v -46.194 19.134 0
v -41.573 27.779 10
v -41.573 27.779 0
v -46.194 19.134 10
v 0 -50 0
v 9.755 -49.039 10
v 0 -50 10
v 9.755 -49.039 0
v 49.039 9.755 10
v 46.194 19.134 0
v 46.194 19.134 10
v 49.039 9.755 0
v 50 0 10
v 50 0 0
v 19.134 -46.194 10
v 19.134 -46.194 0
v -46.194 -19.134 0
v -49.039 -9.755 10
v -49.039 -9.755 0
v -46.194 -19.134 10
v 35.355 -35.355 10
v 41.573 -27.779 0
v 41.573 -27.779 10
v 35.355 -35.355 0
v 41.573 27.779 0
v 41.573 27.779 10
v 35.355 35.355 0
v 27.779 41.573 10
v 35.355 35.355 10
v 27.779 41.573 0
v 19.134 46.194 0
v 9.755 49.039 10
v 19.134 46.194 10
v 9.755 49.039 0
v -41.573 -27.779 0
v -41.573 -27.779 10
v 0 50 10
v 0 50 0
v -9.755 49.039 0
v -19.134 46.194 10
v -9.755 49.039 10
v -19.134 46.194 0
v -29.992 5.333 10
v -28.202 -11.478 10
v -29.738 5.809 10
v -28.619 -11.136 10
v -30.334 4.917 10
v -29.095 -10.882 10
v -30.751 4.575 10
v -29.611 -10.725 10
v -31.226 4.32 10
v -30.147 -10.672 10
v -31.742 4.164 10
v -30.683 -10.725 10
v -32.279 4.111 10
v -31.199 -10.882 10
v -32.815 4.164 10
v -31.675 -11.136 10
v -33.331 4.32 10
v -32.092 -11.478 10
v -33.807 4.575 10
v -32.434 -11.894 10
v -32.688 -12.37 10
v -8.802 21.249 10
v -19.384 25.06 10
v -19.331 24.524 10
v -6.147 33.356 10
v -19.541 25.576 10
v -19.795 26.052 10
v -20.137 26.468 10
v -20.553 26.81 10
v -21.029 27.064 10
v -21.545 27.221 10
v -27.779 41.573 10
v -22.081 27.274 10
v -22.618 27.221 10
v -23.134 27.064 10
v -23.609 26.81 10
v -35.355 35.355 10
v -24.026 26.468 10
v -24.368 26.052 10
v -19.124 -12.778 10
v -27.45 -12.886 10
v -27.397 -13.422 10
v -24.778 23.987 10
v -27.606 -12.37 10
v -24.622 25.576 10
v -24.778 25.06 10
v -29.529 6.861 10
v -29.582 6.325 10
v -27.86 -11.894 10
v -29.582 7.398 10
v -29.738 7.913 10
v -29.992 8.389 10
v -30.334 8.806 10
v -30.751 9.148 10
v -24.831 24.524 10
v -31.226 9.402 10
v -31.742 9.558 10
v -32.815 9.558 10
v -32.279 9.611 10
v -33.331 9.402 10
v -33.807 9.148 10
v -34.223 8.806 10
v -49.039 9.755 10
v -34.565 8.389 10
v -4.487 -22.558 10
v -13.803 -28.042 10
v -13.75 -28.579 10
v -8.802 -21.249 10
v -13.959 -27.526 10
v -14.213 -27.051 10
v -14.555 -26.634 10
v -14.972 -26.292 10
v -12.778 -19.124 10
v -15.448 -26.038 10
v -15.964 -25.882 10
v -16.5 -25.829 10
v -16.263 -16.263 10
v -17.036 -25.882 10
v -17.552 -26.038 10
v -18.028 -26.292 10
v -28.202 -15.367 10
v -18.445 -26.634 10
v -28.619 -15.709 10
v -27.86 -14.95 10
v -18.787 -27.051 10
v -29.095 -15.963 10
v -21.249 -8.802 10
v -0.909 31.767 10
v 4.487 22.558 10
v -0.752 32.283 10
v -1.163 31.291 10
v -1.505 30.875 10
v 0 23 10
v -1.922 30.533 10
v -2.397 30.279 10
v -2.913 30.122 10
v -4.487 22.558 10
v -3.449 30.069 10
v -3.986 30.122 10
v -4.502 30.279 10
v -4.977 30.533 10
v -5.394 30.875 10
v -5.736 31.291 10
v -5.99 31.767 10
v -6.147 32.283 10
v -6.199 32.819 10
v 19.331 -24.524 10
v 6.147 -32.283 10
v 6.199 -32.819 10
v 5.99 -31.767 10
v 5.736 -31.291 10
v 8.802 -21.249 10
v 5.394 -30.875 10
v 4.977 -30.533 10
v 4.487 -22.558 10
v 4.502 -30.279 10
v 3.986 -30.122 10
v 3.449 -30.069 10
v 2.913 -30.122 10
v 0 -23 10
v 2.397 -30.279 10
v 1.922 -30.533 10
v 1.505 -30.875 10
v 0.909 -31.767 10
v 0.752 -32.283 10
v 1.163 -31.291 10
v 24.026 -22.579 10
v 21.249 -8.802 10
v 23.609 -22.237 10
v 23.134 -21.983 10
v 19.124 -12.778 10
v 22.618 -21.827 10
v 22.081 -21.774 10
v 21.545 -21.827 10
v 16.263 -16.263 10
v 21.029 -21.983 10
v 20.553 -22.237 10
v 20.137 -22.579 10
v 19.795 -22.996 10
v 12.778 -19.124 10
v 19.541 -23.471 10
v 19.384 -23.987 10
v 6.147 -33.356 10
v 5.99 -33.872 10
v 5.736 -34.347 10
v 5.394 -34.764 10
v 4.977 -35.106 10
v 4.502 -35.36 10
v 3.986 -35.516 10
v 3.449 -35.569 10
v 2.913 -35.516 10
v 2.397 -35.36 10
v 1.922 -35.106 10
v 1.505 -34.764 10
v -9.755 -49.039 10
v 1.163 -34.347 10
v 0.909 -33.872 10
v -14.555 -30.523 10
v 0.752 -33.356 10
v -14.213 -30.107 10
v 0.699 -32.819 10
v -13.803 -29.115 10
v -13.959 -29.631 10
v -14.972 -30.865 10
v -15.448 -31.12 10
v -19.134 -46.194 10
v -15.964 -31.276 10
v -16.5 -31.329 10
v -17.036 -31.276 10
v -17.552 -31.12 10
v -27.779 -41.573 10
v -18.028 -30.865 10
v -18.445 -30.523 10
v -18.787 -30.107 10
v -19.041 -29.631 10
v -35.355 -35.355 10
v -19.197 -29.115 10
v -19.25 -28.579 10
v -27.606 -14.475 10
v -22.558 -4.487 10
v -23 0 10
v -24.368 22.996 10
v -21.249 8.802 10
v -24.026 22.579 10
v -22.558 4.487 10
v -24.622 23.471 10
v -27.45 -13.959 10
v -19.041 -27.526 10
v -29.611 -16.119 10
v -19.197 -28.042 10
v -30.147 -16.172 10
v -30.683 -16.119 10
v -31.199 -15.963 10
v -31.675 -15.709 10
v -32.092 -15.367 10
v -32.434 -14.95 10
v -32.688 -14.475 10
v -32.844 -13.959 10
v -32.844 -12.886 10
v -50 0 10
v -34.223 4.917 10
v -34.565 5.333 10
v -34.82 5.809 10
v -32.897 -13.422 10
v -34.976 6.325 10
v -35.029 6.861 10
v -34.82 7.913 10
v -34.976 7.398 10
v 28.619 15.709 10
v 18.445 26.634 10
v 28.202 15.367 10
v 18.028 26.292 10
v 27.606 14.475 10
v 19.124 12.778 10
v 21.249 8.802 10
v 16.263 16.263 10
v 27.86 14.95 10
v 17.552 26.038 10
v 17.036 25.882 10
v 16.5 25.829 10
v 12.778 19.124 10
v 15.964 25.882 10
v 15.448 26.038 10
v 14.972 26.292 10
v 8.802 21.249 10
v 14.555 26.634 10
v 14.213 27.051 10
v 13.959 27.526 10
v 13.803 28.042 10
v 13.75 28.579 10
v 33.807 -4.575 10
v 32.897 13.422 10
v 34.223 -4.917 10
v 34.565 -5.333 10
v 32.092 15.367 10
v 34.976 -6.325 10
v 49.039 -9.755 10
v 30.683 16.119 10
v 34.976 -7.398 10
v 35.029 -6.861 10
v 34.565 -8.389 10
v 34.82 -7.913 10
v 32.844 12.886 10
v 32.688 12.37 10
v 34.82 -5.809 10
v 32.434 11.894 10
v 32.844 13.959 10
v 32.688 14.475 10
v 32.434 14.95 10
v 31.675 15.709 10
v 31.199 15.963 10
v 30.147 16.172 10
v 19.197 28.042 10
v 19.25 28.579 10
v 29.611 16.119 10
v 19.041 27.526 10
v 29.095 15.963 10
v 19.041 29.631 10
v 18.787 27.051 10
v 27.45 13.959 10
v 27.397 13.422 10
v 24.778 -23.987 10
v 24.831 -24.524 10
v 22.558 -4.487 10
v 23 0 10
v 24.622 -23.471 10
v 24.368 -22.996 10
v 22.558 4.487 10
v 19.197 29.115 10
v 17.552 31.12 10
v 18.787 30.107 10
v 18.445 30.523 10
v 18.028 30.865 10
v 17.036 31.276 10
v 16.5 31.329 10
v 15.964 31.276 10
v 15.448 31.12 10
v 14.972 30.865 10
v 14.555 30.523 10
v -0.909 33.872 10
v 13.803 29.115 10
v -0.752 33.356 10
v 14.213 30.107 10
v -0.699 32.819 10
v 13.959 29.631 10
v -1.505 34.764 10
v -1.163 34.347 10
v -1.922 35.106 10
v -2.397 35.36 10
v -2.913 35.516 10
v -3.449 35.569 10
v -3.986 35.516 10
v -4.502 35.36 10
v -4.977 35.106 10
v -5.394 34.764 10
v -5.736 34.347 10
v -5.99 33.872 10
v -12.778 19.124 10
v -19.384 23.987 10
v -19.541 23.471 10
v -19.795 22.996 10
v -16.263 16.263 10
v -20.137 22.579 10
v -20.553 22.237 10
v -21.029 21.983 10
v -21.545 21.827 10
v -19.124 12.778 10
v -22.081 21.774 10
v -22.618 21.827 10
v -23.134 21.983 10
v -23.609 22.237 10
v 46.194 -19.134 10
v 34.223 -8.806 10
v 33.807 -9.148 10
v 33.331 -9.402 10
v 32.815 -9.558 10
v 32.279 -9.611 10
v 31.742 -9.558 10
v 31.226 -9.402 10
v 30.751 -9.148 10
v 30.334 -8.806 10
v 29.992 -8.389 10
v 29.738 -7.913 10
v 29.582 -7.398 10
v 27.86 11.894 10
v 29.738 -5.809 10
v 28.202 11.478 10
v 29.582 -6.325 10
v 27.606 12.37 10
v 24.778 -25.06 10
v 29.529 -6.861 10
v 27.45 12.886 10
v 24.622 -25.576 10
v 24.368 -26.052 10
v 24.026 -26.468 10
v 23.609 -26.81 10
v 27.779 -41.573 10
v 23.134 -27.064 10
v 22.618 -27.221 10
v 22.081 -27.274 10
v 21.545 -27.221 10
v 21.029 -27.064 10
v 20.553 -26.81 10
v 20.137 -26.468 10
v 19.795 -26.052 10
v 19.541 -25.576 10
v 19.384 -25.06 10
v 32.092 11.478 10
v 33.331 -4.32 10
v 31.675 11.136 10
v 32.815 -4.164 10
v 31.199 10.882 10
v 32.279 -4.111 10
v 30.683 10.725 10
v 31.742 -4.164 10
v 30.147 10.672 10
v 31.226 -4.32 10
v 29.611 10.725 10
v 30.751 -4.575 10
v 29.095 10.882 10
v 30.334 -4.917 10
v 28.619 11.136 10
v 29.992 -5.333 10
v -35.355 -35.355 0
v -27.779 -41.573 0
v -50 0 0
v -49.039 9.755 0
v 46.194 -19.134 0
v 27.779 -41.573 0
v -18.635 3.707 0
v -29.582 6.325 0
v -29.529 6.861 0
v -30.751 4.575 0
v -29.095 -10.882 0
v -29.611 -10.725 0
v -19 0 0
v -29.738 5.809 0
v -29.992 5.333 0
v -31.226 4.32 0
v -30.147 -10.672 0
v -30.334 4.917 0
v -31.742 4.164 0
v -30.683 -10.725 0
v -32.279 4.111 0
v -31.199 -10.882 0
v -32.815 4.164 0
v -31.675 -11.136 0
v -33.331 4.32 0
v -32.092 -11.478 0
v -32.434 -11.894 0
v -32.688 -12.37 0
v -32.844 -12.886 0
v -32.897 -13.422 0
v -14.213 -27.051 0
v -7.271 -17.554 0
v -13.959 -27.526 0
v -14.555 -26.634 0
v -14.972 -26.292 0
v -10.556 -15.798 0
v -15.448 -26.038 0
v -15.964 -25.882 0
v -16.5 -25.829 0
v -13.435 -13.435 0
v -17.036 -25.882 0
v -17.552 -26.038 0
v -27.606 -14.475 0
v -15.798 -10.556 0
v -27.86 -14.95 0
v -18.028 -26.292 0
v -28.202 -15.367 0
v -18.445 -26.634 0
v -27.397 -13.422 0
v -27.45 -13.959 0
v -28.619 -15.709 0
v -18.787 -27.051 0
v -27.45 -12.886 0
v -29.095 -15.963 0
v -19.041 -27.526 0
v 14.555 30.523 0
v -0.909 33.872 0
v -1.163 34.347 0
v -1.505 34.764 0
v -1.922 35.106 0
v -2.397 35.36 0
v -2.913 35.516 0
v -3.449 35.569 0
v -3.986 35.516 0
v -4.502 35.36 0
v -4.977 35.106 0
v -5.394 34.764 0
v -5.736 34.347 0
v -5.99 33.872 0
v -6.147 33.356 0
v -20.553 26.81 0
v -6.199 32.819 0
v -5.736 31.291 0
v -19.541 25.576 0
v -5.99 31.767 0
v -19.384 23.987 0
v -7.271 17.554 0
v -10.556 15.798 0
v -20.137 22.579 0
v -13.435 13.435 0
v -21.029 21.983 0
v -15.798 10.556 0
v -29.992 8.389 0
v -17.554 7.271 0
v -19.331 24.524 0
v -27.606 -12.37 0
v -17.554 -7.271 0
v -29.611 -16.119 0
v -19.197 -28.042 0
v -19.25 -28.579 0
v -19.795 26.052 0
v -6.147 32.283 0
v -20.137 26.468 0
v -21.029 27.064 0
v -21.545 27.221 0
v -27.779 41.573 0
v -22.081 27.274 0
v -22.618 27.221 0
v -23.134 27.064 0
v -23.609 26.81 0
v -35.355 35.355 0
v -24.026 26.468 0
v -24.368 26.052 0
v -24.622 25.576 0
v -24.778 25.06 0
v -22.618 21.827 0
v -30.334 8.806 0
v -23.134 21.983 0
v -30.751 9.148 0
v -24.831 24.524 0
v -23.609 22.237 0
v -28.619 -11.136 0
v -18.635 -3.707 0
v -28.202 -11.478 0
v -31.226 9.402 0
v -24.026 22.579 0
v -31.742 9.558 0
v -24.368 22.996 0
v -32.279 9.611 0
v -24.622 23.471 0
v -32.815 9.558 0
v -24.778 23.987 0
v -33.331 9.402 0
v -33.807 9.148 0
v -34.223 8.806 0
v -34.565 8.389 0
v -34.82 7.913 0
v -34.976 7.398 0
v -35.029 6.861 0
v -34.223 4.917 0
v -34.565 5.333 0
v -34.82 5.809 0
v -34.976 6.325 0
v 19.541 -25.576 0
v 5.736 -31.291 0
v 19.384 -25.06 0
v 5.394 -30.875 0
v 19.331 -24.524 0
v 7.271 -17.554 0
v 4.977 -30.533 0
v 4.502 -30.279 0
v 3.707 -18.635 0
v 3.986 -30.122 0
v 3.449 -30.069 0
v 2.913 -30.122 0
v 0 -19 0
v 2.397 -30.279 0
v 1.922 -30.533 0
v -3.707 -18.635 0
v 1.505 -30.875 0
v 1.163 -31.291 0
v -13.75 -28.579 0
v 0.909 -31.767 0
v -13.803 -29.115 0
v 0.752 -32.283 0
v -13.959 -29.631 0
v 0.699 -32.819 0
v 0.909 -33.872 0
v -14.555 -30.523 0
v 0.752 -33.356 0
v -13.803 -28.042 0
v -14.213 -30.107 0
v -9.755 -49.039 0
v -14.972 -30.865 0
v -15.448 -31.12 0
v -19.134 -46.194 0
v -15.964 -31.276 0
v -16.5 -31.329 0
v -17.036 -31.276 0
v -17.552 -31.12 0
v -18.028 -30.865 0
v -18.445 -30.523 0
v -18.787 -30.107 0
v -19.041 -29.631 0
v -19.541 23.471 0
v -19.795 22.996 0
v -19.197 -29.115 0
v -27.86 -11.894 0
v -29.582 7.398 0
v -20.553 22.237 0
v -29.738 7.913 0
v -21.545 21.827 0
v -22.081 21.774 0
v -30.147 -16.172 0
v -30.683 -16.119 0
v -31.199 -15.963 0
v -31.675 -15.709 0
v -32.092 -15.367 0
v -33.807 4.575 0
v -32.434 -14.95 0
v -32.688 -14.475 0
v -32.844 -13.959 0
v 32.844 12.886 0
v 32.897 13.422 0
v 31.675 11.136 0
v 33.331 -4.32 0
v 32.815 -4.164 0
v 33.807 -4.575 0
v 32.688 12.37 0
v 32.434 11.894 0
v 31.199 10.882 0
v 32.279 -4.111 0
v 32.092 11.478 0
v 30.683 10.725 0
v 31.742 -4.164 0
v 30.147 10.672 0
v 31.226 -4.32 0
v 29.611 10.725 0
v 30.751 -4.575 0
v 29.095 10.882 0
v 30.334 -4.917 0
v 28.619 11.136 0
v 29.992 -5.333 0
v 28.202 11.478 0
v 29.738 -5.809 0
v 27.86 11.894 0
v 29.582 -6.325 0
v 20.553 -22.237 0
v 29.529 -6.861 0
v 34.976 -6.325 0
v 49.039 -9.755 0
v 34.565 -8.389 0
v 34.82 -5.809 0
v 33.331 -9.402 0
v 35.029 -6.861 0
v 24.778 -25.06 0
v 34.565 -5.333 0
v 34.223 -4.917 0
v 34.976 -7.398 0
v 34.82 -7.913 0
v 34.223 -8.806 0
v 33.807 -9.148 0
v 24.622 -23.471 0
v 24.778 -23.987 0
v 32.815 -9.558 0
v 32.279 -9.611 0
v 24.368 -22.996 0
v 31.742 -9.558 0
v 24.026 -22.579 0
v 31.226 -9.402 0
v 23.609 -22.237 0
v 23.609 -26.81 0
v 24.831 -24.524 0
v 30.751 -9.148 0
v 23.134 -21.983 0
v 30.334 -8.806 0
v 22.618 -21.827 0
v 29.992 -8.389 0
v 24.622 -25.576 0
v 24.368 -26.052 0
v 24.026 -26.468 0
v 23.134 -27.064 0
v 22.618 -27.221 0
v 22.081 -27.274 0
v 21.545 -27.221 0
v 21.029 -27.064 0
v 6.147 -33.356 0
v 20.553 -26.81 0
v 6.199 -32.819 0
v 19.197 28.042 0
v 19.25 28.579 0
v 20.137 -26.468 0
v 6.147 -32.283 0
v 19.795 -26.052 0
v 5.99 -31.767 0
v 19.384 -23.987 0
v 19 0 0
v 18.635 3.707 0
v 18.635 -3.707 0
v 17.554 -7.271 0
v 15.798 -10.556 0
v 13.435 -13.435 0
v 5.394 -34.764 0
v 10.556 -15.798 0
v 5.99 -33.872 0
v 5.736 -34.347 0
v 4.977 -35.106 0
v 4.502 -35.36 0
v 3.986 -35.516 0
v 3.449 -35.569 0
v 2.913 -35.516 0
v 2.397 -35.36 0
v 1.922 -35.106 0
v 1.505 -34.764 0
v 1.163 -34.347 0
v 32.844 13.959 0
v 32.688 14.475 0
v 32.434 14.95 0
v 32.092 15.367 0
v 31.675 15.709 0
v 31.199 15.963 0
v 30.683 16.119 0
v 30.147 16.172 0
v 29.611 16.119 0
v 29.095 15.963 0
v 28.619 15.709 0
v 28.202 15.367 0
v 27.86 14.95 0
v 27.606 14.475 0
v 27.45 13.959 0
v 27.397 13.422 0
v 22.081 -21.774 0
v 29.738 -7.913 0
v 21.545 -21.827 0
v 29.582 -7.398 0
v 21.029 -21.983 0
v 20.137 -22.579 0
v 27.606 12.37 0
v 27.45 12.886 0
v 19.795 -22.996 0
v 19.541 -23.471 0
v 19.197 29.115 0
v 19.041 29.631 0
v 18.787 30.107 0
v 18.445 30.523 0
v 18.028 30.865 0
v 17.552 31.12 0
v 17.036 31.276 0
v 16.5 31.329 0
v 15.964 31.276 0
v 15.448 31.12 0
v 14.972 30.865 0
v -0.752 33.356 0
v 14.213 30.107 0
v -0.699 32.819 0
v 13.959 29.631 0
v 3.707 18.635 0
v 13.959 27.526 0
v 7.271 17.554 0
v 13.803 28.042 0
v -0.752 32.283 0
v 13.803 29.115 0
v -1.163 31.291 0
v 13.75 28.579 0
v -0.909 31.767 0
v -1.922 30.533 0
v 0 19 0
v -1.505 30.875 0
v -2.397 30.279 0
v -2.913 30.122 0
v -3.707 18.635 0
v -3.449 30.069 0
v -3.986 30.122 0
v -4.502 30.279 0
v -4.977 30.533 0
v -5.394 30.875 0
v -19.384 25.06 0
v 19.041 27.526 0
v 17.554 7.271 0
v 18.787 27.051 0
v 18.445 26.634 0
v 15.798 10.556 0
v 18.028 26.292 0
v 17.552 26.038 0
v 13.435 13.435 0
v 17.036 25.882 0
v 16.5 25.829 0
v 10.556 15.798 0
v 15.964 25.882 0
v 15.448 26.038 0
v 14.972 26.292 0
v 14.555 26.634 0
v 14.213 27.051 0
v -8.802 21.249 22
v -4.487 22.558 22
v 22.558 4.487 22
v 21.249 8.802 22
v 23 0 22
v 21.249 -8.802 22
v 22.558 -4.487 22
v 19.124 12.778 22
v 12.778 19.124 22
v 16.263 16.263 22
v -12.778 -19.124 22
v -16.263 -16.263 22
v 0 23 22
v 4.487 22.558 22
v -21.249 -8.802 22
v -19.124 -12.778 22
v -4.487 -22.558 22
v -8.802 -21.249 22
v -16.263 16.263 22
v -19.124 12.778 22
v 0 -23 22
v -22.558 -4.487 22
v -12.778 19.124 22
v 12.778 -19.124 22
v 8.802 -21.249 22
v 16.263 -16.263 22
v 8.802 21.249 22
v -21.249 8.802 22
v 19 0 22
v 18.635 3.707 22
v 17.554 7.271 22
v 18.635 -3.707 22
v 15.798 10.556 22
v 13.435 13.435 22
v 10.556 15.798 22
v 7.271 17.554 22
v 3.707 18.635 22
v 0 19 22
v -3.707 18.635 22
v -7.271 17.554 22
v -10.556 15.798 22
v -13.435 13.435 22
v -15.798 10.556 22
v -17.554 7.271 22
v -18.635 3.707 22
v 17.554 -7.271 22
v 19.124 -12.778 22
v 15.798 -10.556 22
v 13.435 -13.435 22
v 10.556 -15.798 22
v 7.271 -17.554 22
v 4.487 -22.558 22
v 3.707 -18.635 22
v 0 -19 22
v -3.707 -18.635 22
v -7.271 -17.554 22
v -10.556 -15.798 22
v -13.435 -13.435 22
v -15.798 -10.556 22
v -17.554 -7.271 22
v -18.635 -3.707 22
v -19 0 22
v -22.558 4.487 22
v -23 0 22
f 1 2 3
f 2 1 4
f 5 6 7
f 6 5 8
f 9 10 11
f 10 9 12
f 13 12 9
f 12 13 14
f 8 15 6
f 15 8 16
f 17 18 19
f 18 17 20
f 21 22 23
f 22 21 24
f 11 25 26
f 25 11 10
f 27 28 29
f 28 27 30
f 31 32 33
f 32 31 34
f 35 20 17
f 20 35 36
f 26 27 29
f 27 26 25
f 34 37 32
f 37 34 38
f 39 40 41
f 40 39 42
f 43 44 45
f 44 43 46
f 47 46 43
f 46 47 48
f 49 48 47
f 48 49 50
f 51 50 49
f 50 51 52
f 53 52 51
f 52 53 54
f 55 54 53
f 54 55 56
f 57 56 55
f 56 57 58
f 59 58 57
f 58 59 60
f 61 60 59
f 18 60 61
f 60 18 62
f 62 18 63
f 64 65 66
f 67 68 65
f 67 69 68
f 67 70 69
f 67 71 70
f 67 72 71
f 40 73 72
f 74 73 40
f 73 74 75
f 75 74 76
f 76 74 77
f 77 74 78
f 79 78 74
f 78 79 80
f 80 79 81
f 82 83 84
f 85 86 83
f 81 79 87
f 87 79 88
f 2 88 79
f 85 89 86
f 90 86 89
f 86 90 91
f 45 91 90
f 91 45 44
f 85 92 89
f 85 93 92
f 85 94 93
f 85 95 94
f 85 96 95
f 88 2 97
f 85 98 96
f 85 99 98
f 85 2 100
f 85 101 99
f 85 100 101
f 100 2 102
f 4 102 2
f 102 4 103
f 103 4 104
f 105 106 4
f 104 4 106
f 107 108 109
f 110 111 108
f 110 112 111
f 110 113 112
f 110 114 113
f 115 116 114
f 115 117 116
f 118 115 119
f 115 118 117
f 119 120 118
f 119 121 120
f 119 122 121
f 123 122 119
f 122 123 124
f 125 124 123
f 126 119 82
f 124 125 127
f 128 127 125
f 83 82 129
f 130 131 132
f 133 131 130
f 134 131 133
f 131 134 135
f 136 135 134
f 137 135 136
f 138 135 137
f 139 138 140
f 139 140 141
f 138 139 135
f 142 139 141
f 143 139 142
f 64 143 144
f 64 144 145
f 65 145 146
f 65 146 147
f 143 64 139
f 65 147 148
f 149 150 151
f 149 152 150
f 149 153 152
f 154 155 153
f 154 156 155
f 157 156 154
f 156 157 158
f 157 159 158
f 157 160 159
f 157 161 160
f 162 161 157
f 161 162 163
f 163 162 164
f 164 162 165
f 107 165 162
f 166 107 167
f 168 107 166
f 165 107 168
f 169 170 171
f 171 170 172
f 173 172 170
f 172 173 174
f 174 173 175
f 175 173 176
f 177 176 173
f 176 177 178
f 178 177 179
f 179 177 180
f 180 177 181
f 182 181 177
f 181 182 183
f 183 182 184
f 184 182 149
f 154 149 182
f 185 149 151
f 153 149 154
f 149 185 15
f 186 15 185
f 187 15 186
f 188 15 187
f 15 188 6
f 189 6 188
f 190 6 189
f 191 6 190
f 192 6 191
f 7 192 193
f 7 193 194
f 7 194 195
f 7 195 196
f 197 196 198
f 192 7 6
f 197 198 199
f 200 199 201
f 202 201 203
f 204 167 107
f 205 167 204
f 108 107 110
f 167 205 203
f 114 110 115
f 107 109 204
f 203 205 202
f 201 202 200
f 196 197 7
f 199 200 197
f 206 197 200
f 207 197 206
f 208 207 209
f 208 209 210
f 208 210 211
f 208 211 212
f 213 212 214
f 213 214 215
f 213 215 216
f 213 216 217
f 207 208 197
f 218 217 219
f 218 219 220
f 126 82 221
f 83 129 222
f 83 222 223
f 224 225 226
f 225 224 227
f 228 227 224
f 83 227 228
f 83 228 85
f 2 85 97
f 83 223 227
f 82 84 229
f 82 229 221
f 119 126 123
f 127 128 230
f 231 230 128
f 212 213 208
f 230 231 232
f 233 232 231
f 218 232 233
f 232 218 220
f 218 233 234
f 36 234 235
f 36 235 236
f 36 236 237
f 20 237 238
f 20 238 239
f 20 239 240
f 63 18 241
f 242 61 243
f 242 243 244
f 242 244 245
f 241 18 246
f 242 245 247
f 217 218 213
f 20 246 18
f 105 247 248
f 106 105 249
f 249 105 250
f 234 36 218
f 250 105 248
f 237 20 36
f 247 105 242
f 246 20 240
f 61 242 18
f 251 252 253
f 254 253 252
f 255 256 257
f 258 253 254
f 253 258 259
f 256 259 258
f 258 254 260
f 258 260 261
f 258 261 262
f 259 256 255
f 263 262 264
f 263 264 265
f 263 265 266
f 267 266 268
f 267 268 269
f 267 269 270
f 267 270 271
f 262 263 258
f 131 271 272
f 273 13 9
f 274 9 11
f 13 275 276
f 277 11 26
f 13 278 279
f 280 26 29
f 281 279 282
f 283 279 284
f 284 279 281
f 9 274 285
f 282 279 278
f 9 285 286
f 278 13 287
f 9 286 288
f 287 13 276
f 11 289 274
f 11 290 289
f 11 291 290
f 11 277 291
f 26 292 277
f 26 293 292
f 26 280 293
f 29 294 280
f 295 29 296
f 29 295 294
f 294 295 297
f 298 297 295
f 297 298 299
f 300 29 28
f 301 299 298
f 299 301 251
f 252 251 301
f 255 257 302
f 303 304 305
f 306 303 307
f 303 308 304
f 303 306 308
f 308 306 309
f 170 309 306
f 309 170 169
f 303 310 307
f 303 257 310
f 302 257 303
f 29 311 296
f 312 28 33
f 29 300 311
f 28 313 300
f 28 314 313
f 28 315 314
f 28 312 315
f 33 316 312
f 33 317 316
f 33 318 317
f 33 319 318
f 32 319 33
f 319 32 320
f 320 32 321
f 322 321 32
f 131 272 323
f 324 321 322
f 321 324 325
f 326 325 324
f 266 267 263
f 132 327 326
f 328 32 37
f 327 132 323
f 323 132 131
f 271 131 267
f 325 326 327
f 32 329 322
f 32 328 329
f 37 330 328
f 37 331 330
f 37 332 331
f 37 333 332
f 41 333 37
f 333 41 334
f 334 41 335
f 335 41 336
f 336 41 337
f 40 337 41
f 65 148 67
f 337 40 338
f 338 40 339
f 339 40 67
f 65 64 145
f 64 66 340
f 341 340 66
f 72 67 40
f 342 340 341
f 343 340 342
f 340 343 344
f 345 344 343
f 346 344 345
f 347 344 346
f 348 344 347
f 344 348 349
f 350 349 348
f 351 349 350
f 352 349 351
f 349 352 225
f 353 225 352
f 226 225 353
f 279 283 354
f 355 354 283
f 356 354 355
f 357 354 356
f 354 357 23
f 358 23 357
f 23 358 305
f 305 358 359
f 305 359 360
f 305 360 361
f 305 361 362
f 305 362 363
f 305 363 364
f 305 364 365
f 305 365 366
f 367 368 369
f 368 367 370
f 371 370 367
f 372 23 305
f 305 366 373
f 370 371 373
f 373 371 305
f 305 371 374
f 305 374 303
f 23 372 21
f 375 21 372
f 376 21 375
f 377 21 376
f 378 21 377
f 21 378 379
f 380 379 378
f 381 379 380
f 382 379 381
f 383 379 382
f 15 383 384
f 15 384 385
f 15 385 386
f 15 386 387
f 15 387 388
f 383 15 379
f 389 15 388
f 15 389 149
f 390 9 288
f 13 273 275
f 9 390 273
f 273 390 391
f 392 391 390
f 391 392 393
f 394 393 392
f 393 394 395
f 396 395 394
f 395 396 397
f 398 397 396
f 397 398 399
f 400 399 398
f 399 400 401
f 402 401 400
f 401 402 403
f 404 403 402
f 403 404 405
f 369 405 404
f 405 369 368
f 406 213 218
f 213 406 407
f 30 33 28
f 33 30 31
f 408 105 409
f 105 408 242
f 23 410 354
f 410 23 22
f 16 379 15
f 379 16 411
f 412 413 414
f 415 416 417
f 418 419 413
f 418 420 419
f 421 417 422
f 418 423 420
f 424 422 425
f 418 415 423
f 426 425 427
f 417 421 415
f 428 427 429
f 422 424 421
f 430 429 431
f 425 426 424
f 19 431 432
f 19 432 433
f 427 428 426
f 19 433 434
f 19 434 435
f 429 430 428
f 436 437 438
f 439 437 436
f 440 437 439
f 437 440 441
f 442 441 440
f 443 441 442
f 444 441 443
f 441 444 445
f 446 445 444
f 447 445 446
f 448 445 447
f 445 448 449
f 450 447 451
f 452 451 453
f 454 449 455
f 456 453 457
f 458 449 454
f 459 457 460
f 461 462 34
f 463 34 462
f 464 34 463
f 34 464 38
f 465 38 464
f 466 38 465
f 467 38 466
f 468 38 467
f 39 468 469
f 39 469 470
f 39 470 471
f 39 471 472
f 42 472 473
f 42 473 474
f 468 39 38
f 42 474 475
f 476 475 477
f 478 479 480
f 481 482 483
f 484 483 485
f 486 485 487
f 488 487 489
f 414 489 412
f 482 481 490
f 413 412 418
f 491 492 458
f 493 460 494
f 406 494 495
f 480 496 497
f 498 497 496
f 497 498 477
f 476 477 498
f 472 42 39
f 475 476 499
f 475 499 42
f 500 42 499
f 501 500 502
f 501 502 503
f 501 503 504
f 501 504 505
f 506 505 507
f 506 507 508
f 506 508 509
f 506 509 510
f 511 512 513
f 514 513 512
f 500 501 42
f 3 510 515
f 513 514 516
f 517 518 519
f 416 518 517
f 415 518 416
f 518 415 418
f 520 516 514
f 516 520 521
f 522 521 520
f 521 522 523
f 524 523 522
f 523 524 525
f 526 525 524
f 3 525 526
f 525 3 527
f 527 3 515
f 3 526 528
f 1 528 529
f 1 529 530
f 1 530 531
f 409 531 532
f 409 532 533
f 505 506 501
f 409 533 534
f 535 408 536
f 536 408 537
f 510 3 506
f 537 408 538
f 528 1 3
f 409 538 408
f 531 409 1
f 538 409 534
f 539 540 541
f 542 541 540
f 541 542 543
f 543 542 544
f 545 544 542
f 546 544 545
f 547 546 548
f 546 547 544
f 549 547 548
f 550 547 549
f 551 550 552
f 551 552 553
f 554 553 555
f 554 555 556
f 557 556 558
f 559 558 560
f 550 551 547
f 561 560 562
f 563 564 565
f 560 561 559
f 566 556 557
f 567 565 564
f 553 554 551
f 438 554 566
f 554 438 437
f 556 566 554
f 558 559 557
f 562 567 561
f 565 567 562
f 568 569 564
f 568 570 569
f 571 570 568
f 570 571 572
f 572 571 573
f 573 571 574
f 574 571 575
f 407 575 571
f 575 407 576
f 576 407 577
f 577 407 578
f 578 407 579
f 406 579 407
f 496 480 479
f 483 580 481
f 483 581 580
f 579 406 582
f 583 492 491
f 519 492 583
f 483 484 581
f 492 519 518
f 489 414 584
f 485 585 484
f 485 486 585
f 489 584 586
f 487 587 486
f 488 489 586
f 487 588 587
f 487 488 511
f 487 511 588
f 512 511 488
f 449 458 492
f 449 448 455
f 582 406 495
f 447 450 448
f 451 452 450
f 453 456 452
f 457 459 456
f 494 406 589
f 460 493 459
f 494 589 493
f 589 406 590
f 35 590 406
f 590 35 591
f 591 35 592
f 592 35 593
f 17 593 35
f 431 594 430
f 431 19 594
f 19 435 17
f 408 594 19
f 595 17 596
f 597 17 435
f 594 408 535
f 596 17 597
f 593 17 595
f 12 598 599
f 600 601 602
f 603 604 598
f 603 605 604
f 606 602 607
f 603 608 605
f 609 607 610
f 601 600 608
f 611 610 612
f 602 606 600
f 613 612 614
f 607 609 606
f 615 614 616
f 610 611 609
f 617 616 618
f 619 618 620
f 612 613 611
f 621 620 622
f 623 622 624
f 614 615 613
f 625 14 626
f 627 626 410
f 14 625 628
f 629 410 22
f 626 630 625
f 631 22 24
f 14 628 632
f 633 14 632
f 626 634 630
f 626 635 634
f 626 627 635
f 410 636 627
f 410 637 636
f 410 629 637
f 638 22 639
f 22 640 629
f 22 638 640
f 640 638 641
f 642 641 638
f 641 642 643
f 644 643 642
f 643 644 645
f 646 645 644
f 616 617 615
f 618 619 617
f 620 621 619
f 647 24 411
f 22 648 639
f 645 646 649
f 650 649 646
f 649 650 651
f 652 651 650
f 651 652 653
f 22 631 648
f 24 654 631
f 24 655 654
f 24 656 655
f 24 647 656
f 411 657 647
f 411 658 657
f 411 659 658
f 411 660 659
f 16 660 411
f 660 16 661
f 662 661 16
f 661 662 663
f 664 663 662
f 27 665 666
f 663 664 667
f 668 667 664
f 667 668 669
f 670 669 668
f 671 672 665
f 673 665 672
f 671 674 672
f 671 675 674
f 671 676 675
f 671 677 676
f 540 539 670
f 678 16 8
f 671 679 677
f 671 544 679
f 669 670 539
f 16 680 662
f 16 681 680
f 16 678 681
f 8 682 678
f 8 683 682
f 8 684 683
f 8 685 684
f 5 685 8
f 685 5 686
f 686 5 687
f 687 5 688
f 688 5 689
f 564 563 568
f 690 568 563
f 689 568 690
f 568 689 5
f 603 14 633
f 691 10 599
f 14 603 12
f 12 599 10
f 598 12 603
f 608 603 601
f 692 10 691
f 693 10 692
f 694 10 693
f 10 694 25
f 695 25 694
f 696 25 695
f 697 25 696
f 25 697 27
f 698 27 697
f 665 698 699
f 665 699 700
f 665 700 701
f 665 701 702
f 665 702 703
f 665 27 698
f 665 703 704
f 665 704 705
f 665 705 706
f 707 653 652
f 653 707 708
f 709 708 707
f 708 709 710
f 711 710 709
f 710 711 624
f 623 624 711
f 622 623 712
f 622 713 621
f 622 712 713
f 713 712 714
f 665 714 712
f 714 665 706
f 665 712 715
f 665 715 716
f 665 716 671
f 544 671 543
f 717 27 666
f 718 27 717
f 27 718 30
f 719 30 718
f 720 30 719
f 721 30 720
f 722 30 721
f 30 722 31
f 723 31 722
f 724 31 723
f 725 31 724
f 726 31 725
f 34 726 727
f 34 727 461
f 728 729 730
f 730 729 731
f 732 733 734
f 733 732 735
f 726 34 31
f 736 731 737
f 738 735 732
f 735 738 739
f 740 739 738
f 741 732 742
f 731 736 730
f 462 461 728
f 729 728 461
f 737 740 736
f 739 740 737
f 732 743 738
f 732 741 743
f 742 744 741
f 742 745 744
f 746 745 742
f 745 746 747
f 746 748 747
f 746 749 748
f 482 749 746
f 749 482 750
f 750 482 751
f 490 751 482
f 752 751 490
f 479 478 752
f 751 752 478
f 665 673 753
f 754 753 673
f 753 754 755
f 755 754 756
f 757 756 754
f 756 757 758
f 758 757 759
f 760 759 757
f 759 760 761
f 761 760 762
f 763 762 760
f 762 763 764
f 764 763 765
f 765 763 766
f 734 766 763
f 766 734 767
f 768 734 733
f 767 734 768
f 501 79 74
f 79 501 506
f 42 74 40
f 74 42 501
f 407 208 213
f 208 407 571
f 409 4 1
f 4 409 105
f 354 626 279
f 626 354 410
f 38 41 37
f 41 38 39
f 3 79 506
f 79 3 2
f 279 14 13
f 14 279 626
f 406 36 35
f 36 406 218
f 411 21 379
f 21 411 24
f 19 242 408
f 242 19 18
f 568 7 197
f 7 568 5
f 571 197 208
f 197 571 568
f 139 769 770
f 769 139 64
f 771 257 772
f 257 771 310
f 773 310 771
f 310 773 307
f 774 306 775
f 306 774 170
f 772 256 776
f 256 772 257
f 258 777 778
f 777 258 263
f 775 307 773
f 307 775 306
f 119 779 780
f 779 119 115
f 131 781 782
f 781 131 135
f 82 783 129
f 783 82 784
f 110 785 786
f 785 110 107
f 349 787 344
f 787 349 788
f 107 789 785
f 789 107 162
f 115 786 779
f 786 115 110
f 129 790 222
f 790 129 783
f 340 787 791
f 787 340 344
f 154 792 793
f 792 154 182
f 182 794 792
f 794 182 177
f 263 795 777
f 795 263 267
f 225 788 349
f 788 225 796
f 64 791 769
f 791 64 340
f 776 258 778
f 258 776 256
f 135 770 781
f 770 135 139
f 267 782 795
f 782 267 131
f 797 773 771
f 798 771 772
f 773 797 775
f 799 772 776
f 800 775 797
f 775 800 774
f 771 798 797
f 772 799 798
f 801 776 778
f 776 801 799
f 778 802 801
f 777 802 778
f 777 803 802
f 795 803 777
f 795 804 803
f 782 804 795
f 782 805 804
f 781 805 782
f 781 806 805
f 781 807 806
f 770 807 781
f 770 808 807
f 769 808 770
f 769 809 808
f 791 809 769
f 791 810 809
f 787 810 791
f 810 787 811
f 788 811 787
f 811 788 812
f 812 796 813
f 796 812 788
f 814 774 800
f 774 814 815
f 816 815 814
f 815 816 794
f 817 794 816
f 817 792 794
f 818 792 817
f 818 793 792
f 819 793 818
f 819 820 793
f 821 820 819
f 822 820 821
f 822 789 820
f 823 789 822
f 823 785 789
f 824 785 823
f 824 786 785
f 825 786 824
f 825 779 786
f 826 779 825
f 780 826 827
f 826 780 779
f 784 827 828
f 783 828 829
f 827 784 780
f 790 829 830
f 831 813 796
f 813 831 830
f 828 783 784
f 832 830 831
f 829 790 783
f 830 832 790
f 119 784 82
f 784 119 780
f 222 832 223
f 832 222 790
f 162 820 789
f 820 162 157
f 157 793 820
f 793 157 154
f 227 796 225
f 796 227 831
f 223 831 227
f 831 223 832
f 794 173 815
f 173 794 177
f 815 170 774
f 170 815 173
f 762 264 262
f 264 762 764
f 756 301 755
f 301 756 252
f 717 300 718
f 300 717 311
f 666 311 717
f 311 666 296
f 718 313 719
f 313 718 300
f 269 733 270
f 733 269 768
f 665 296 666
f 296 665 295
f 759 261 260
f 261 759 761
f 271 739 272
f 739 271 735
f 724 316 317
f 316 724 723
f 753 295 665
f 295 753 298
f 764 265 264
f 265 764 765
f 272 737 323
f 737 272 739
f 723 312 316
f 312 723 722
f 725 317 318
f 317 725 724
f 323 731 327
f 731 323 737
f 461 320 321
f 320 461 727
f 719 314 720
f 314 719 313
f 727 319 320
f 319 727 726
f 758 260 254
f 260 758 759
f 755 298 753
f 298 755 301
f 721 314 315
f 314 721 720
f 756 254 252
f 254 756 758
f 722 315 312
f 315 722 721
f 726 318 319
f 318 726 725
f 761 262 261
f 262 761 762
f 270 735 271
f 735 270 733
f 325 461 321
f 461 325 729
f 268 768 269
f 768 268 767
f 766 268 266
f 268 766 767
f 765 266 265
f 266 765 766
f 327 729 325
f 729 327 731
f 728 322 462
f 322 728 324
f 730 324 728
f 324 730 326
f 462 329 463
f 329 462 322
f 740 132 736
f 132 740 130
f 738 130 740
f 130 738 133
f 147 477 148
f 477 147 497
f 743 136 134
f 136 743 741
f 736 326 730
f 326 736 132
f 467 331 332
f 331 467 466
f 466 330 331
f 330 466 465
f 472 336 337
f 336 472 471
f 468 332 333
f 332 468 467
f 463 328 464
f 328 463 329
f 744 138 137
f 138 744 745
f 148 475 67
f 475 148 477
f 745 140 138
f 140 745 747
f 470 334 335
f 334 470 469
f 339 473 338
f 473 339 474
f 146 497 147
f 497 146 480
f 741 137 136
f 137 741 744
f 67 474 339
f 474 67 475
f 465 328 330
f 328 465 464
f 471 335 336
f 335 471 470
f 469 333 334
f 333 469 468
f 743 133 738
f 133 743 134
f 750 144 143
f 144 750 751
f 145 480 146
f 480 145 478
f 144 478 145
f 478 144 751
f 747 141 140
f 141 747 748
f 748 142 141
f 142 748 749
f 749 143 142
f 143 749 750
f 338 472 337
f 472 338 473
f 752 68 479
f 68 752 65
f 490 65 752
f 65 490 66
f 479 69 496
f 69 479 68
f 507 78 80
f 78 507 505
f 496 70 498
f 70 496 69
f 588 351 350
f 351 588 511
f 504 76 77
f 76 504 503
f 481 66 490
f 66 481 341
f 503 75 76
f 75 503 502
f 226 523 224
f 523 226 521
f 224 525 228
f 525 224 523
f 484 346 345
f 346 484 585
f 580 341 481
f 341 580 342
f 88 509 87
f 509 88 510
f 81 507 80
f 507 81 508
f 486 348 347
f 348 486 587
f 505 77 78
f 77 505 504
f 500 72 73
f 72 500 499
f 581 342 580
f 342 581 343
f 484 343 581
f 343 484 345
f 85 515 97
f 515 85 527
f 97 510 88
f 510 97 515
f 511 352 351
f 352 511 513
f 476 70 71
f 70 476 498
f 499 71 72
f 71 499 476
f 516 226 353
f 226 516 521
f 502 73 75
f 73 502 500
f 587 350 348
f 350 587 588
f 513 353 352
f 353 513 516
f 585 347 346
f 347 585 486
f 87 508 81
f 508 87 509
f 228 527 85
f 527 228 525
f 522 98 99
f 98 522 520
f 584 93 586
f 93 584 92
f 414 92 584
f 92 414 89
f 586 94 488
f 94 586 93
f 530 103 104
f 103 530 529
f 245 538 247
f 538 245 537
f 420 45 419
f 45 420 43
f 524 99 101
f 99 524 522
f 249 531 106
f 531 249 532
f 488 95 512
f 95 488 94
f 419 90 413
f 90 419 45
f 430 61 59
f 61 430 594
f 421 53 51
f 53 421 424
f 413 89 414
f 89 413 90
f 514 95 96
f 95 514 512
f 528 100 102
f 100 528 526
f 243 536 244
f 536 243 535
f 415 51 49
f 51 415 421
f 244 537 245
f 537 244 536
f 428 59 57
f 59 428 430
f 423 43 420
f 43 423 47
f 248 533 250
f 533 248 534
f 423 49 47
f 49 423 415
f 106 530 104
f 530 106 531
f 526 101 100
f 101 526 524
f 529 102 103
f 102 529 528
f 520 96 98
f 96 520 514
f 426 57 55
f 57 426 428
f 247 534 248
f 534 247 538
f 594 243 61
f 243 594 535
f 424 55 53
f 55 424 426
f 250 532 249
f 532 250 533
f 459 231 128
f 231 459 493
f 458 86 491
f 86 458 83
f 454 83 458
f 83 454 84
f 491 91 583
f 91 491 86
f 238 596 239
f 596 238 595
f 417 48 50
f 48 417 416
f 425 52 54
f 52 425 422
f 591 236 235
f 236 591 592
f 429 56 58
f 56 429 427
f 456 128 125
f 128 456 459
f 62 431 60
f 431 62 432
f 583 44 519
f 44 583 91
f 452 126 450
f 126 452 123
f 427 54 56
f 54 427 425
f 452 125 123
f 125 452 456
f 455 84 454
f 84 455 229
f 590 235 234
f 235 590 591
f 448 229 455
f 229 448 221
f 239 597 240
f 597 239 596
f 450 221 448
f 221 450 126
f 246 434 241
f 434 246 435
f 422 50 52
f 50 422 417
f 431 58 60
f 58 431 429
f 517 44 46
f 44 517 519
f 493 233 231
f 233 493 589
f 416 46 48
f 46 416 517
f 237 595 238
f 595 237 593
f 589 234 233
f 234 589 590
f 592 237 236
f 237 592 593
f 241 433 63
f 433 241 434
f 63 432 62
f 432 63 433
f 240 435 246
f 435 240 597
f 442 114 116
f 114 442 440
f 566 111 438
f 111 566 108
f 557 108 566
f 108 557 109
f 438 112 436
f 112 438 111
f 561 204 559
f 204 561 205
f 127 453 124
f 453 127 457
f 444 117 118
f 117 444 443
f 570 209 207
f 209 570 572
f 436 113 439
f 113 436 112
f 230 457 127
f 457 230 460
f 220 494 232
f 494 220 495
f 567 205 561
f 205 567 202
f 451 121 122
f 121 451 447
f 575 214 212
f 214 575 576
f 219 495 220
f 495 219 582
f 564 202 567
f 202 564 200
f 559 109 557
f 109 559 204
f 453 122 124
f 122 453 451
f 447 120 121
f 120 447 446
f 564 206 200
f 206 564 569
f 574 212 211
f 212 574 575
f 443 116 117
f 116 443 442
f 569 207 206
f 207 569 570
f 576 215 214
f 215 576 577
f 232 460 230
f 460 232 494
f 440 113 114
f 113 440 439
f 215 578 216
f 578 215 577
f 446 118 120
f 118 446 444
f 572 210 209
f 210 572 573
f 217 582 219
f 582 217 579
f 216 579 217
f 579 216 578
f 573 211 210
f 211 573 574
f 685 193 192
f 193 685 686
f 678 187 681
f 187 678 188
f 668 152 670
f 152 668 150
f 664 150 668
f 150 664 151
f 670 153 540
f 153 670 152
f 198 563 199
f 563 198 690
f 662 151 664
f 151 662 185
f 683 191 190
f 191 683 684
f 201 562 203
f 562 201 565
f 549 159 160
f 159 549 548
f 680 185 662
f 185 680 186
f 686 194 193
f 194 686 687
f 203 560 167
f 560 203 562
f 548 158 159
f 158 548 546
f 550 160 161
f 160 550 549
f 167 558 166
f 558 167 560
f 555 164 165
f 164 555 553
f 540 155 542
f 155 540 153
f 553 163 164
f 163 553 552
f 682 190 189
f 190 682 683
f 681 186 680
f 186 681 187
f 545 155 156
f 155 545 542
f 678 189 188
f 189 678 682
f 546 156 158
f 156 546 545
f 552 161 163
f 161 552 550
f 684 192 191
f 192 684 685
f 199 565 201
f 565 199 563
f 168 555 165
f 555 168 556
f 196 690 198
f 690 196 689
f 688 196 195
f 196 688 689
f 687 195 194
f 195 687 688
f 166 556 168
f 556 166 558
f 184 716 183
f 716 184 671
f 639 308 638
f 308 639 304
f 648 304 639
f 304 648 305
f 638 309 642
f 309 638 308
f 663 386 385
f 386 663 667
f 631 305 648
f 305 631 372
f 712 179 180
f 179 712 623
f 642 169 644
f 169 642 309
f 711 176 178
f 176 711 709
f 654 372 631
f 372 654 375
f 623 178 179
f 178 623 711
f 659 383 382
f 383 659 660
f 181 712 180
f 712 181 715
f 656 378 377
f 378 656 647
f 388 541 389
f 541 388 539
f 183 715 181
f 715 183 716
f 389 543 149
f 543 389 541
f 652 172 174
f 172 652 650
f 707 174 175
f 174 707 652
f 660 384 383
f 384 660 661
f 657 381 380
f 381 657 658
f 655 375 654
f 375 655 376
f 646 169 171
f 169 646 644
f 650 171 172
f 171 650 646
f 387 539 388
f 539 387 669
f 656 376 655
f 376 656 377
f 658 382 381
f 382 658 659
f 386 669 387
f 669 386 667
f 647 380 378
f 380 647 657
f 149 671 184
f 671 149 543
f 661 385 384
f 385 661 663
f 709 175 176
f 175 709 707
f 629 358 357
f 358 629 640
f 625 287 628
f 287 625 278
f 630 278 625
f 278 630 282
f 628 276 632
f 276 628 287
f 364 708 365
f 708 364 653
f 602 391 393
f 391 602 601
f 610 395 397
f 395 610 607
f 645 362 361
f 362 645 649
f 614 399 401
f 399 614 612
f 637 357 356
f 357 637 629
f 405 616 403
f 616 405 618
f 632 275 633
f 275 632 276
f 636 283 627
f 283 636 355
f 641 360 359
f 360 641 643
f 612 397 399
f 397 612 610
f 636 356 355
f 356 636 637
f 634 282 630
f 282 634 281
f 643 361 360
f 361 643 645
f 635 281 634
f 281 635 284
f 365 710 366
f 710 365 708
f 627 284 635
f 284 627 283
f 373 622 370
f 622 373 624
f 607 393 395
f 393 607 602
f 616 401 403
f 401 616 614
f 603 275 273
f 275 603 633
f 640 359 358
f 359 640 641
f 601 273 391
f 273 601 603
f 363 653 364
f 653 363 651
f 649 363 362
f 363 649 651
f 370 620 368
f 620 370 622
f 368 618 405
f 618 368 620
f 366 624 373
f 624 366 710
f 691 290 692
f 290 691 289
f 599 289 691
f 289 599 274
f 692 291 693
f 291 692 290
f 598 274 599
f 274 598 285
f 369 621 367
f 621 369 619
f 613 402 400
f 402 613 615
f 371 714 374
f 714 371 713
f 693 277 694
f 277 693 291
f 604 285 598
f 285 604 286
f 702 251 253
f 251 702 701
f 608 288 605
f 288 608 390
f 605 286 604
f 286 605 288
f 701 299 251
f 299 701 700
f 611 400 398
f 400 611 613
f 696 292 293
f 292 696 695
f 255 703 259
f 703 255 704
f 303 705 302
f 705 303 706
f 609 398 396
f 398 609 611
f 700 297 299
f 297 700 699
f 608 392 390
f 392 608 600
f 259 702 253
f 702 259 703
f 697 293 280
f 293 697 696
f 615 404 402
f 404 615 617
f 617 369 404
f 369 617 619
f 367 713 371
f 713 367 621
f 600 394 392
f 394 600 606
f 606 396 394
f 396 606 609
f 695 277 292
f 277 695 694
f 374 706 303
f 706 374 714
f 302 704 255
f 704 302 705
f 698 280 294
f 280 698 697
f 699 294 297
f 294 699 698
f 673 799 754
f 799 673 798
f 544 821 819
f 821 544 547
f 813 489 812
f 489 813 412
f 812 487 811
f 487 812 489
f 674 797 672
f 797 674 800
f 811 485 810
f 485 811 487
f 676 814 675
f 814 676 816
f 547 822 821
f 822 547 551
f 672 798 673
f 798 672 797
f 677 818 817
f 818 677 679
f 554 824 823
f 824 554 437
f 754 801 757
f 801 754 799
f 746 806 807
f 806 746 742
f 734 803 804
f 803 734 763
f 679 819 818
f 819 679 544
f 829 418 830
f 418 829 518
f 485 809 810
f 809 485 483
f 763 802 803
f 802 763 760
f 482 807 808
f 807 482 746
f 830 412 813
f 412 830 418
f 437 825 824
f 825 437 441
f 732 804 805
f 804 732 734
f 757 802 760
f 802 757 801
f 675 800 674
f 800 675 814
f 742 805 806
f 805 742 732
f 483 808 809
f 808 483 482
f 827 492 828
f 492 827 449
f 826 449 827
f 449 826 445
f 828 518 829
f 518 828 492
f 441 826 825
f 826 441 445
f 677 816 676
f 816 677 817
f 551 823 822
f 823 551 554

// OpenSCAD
$fn = 32;

// ----------------------------------------------------------------------
// Flange Ø100 x 10
// 10 holes on a Ø66 bolt circle, bolted joints
// ----------------------------------------------------------------------

// --- parameters (mm) ---
flange_d = 100;  // outside diameter of the flange
thickness = 10;  // flange thickness
holes = 10;      // number of bolt holes
pcd = 66;        // bolt circle diameter
start_deg = 60;  // angle of the first hole, from +X
hole_d = 5.5;    // bolt hole diameter
bore_d = 38;     // central through bore
hub_d = 46;      // hub outside diameter
hub_h = 12;      // hub height above the flange face (0 = no hub)

// --- derived feature positions (mm) ---
height = thickness + hub_h;  // = 22   overall height of the part
pcd_r = pcd / 2;             // = 33   bolt circle radius
hole_step = 360 / holes;     // = 36   angular pitch
feature_centers = [
  [pcd_r * cos(start_deg + 0 * hole_step), pcd_r * sin(start_deg + 0 * hole_step)],
  [pcd_r * cos(start_deg + 1 * hole_step), pcd_r * sin(start_deg + 1 * hole_step)],
  [pcd_r * cos(start_deg + 2 * hole_step), pcd_r * sin(start_deg + 2 * hole_step)],
  [pcd_r * cos(start_deg + 3 * hole_step), pcd_r * sin(start_deg + 3 * hole_step)],
  [pcd_r * cos(start_deg + 4 * hole_step), pcd_r * sin(start_deg + 4 * hole_step)],
  [pcd_r * cos(start_deg + 5 * hole_step), pcd_r * sin(start_deg + 5 * hole_step)],
  [pcd_r * cos(start_deg + 6 * hole_step), pcd_r * sin(start_deg + 6 * hole_step)],
  [pcd_r * cos(start_deg + 7 * hole_step), pcd_r * sin(start_deg + 7 * hole_step)],
  [pcd_r * cos(start_deg + 8 * hole_step), pcd_r * sin(start_deg + 8 * hole_step)],
  [pcd_r * cos(start_deg + 9 * hole_step), pcd_r * sin(start_deg + 9 * hole_step)]
];   // bolt hole centres on the pitch circle

// flange disc, every hole and the bore cut straight through
difference() {
  union() {
    cylinder(d = flange_d, h = thickness);
    cylinder(d = hub_d, h = height);  // hub, overlapped into the flange
  }
  translate([0, 0, -1]) cylinder(d = bore_d, h = height + 2);  // bore, through
  for (centre = feature_centers)
    translate([centre[0], centre[1], -1]) cylinder(d = hole_d, h = thickness + 2);
}
